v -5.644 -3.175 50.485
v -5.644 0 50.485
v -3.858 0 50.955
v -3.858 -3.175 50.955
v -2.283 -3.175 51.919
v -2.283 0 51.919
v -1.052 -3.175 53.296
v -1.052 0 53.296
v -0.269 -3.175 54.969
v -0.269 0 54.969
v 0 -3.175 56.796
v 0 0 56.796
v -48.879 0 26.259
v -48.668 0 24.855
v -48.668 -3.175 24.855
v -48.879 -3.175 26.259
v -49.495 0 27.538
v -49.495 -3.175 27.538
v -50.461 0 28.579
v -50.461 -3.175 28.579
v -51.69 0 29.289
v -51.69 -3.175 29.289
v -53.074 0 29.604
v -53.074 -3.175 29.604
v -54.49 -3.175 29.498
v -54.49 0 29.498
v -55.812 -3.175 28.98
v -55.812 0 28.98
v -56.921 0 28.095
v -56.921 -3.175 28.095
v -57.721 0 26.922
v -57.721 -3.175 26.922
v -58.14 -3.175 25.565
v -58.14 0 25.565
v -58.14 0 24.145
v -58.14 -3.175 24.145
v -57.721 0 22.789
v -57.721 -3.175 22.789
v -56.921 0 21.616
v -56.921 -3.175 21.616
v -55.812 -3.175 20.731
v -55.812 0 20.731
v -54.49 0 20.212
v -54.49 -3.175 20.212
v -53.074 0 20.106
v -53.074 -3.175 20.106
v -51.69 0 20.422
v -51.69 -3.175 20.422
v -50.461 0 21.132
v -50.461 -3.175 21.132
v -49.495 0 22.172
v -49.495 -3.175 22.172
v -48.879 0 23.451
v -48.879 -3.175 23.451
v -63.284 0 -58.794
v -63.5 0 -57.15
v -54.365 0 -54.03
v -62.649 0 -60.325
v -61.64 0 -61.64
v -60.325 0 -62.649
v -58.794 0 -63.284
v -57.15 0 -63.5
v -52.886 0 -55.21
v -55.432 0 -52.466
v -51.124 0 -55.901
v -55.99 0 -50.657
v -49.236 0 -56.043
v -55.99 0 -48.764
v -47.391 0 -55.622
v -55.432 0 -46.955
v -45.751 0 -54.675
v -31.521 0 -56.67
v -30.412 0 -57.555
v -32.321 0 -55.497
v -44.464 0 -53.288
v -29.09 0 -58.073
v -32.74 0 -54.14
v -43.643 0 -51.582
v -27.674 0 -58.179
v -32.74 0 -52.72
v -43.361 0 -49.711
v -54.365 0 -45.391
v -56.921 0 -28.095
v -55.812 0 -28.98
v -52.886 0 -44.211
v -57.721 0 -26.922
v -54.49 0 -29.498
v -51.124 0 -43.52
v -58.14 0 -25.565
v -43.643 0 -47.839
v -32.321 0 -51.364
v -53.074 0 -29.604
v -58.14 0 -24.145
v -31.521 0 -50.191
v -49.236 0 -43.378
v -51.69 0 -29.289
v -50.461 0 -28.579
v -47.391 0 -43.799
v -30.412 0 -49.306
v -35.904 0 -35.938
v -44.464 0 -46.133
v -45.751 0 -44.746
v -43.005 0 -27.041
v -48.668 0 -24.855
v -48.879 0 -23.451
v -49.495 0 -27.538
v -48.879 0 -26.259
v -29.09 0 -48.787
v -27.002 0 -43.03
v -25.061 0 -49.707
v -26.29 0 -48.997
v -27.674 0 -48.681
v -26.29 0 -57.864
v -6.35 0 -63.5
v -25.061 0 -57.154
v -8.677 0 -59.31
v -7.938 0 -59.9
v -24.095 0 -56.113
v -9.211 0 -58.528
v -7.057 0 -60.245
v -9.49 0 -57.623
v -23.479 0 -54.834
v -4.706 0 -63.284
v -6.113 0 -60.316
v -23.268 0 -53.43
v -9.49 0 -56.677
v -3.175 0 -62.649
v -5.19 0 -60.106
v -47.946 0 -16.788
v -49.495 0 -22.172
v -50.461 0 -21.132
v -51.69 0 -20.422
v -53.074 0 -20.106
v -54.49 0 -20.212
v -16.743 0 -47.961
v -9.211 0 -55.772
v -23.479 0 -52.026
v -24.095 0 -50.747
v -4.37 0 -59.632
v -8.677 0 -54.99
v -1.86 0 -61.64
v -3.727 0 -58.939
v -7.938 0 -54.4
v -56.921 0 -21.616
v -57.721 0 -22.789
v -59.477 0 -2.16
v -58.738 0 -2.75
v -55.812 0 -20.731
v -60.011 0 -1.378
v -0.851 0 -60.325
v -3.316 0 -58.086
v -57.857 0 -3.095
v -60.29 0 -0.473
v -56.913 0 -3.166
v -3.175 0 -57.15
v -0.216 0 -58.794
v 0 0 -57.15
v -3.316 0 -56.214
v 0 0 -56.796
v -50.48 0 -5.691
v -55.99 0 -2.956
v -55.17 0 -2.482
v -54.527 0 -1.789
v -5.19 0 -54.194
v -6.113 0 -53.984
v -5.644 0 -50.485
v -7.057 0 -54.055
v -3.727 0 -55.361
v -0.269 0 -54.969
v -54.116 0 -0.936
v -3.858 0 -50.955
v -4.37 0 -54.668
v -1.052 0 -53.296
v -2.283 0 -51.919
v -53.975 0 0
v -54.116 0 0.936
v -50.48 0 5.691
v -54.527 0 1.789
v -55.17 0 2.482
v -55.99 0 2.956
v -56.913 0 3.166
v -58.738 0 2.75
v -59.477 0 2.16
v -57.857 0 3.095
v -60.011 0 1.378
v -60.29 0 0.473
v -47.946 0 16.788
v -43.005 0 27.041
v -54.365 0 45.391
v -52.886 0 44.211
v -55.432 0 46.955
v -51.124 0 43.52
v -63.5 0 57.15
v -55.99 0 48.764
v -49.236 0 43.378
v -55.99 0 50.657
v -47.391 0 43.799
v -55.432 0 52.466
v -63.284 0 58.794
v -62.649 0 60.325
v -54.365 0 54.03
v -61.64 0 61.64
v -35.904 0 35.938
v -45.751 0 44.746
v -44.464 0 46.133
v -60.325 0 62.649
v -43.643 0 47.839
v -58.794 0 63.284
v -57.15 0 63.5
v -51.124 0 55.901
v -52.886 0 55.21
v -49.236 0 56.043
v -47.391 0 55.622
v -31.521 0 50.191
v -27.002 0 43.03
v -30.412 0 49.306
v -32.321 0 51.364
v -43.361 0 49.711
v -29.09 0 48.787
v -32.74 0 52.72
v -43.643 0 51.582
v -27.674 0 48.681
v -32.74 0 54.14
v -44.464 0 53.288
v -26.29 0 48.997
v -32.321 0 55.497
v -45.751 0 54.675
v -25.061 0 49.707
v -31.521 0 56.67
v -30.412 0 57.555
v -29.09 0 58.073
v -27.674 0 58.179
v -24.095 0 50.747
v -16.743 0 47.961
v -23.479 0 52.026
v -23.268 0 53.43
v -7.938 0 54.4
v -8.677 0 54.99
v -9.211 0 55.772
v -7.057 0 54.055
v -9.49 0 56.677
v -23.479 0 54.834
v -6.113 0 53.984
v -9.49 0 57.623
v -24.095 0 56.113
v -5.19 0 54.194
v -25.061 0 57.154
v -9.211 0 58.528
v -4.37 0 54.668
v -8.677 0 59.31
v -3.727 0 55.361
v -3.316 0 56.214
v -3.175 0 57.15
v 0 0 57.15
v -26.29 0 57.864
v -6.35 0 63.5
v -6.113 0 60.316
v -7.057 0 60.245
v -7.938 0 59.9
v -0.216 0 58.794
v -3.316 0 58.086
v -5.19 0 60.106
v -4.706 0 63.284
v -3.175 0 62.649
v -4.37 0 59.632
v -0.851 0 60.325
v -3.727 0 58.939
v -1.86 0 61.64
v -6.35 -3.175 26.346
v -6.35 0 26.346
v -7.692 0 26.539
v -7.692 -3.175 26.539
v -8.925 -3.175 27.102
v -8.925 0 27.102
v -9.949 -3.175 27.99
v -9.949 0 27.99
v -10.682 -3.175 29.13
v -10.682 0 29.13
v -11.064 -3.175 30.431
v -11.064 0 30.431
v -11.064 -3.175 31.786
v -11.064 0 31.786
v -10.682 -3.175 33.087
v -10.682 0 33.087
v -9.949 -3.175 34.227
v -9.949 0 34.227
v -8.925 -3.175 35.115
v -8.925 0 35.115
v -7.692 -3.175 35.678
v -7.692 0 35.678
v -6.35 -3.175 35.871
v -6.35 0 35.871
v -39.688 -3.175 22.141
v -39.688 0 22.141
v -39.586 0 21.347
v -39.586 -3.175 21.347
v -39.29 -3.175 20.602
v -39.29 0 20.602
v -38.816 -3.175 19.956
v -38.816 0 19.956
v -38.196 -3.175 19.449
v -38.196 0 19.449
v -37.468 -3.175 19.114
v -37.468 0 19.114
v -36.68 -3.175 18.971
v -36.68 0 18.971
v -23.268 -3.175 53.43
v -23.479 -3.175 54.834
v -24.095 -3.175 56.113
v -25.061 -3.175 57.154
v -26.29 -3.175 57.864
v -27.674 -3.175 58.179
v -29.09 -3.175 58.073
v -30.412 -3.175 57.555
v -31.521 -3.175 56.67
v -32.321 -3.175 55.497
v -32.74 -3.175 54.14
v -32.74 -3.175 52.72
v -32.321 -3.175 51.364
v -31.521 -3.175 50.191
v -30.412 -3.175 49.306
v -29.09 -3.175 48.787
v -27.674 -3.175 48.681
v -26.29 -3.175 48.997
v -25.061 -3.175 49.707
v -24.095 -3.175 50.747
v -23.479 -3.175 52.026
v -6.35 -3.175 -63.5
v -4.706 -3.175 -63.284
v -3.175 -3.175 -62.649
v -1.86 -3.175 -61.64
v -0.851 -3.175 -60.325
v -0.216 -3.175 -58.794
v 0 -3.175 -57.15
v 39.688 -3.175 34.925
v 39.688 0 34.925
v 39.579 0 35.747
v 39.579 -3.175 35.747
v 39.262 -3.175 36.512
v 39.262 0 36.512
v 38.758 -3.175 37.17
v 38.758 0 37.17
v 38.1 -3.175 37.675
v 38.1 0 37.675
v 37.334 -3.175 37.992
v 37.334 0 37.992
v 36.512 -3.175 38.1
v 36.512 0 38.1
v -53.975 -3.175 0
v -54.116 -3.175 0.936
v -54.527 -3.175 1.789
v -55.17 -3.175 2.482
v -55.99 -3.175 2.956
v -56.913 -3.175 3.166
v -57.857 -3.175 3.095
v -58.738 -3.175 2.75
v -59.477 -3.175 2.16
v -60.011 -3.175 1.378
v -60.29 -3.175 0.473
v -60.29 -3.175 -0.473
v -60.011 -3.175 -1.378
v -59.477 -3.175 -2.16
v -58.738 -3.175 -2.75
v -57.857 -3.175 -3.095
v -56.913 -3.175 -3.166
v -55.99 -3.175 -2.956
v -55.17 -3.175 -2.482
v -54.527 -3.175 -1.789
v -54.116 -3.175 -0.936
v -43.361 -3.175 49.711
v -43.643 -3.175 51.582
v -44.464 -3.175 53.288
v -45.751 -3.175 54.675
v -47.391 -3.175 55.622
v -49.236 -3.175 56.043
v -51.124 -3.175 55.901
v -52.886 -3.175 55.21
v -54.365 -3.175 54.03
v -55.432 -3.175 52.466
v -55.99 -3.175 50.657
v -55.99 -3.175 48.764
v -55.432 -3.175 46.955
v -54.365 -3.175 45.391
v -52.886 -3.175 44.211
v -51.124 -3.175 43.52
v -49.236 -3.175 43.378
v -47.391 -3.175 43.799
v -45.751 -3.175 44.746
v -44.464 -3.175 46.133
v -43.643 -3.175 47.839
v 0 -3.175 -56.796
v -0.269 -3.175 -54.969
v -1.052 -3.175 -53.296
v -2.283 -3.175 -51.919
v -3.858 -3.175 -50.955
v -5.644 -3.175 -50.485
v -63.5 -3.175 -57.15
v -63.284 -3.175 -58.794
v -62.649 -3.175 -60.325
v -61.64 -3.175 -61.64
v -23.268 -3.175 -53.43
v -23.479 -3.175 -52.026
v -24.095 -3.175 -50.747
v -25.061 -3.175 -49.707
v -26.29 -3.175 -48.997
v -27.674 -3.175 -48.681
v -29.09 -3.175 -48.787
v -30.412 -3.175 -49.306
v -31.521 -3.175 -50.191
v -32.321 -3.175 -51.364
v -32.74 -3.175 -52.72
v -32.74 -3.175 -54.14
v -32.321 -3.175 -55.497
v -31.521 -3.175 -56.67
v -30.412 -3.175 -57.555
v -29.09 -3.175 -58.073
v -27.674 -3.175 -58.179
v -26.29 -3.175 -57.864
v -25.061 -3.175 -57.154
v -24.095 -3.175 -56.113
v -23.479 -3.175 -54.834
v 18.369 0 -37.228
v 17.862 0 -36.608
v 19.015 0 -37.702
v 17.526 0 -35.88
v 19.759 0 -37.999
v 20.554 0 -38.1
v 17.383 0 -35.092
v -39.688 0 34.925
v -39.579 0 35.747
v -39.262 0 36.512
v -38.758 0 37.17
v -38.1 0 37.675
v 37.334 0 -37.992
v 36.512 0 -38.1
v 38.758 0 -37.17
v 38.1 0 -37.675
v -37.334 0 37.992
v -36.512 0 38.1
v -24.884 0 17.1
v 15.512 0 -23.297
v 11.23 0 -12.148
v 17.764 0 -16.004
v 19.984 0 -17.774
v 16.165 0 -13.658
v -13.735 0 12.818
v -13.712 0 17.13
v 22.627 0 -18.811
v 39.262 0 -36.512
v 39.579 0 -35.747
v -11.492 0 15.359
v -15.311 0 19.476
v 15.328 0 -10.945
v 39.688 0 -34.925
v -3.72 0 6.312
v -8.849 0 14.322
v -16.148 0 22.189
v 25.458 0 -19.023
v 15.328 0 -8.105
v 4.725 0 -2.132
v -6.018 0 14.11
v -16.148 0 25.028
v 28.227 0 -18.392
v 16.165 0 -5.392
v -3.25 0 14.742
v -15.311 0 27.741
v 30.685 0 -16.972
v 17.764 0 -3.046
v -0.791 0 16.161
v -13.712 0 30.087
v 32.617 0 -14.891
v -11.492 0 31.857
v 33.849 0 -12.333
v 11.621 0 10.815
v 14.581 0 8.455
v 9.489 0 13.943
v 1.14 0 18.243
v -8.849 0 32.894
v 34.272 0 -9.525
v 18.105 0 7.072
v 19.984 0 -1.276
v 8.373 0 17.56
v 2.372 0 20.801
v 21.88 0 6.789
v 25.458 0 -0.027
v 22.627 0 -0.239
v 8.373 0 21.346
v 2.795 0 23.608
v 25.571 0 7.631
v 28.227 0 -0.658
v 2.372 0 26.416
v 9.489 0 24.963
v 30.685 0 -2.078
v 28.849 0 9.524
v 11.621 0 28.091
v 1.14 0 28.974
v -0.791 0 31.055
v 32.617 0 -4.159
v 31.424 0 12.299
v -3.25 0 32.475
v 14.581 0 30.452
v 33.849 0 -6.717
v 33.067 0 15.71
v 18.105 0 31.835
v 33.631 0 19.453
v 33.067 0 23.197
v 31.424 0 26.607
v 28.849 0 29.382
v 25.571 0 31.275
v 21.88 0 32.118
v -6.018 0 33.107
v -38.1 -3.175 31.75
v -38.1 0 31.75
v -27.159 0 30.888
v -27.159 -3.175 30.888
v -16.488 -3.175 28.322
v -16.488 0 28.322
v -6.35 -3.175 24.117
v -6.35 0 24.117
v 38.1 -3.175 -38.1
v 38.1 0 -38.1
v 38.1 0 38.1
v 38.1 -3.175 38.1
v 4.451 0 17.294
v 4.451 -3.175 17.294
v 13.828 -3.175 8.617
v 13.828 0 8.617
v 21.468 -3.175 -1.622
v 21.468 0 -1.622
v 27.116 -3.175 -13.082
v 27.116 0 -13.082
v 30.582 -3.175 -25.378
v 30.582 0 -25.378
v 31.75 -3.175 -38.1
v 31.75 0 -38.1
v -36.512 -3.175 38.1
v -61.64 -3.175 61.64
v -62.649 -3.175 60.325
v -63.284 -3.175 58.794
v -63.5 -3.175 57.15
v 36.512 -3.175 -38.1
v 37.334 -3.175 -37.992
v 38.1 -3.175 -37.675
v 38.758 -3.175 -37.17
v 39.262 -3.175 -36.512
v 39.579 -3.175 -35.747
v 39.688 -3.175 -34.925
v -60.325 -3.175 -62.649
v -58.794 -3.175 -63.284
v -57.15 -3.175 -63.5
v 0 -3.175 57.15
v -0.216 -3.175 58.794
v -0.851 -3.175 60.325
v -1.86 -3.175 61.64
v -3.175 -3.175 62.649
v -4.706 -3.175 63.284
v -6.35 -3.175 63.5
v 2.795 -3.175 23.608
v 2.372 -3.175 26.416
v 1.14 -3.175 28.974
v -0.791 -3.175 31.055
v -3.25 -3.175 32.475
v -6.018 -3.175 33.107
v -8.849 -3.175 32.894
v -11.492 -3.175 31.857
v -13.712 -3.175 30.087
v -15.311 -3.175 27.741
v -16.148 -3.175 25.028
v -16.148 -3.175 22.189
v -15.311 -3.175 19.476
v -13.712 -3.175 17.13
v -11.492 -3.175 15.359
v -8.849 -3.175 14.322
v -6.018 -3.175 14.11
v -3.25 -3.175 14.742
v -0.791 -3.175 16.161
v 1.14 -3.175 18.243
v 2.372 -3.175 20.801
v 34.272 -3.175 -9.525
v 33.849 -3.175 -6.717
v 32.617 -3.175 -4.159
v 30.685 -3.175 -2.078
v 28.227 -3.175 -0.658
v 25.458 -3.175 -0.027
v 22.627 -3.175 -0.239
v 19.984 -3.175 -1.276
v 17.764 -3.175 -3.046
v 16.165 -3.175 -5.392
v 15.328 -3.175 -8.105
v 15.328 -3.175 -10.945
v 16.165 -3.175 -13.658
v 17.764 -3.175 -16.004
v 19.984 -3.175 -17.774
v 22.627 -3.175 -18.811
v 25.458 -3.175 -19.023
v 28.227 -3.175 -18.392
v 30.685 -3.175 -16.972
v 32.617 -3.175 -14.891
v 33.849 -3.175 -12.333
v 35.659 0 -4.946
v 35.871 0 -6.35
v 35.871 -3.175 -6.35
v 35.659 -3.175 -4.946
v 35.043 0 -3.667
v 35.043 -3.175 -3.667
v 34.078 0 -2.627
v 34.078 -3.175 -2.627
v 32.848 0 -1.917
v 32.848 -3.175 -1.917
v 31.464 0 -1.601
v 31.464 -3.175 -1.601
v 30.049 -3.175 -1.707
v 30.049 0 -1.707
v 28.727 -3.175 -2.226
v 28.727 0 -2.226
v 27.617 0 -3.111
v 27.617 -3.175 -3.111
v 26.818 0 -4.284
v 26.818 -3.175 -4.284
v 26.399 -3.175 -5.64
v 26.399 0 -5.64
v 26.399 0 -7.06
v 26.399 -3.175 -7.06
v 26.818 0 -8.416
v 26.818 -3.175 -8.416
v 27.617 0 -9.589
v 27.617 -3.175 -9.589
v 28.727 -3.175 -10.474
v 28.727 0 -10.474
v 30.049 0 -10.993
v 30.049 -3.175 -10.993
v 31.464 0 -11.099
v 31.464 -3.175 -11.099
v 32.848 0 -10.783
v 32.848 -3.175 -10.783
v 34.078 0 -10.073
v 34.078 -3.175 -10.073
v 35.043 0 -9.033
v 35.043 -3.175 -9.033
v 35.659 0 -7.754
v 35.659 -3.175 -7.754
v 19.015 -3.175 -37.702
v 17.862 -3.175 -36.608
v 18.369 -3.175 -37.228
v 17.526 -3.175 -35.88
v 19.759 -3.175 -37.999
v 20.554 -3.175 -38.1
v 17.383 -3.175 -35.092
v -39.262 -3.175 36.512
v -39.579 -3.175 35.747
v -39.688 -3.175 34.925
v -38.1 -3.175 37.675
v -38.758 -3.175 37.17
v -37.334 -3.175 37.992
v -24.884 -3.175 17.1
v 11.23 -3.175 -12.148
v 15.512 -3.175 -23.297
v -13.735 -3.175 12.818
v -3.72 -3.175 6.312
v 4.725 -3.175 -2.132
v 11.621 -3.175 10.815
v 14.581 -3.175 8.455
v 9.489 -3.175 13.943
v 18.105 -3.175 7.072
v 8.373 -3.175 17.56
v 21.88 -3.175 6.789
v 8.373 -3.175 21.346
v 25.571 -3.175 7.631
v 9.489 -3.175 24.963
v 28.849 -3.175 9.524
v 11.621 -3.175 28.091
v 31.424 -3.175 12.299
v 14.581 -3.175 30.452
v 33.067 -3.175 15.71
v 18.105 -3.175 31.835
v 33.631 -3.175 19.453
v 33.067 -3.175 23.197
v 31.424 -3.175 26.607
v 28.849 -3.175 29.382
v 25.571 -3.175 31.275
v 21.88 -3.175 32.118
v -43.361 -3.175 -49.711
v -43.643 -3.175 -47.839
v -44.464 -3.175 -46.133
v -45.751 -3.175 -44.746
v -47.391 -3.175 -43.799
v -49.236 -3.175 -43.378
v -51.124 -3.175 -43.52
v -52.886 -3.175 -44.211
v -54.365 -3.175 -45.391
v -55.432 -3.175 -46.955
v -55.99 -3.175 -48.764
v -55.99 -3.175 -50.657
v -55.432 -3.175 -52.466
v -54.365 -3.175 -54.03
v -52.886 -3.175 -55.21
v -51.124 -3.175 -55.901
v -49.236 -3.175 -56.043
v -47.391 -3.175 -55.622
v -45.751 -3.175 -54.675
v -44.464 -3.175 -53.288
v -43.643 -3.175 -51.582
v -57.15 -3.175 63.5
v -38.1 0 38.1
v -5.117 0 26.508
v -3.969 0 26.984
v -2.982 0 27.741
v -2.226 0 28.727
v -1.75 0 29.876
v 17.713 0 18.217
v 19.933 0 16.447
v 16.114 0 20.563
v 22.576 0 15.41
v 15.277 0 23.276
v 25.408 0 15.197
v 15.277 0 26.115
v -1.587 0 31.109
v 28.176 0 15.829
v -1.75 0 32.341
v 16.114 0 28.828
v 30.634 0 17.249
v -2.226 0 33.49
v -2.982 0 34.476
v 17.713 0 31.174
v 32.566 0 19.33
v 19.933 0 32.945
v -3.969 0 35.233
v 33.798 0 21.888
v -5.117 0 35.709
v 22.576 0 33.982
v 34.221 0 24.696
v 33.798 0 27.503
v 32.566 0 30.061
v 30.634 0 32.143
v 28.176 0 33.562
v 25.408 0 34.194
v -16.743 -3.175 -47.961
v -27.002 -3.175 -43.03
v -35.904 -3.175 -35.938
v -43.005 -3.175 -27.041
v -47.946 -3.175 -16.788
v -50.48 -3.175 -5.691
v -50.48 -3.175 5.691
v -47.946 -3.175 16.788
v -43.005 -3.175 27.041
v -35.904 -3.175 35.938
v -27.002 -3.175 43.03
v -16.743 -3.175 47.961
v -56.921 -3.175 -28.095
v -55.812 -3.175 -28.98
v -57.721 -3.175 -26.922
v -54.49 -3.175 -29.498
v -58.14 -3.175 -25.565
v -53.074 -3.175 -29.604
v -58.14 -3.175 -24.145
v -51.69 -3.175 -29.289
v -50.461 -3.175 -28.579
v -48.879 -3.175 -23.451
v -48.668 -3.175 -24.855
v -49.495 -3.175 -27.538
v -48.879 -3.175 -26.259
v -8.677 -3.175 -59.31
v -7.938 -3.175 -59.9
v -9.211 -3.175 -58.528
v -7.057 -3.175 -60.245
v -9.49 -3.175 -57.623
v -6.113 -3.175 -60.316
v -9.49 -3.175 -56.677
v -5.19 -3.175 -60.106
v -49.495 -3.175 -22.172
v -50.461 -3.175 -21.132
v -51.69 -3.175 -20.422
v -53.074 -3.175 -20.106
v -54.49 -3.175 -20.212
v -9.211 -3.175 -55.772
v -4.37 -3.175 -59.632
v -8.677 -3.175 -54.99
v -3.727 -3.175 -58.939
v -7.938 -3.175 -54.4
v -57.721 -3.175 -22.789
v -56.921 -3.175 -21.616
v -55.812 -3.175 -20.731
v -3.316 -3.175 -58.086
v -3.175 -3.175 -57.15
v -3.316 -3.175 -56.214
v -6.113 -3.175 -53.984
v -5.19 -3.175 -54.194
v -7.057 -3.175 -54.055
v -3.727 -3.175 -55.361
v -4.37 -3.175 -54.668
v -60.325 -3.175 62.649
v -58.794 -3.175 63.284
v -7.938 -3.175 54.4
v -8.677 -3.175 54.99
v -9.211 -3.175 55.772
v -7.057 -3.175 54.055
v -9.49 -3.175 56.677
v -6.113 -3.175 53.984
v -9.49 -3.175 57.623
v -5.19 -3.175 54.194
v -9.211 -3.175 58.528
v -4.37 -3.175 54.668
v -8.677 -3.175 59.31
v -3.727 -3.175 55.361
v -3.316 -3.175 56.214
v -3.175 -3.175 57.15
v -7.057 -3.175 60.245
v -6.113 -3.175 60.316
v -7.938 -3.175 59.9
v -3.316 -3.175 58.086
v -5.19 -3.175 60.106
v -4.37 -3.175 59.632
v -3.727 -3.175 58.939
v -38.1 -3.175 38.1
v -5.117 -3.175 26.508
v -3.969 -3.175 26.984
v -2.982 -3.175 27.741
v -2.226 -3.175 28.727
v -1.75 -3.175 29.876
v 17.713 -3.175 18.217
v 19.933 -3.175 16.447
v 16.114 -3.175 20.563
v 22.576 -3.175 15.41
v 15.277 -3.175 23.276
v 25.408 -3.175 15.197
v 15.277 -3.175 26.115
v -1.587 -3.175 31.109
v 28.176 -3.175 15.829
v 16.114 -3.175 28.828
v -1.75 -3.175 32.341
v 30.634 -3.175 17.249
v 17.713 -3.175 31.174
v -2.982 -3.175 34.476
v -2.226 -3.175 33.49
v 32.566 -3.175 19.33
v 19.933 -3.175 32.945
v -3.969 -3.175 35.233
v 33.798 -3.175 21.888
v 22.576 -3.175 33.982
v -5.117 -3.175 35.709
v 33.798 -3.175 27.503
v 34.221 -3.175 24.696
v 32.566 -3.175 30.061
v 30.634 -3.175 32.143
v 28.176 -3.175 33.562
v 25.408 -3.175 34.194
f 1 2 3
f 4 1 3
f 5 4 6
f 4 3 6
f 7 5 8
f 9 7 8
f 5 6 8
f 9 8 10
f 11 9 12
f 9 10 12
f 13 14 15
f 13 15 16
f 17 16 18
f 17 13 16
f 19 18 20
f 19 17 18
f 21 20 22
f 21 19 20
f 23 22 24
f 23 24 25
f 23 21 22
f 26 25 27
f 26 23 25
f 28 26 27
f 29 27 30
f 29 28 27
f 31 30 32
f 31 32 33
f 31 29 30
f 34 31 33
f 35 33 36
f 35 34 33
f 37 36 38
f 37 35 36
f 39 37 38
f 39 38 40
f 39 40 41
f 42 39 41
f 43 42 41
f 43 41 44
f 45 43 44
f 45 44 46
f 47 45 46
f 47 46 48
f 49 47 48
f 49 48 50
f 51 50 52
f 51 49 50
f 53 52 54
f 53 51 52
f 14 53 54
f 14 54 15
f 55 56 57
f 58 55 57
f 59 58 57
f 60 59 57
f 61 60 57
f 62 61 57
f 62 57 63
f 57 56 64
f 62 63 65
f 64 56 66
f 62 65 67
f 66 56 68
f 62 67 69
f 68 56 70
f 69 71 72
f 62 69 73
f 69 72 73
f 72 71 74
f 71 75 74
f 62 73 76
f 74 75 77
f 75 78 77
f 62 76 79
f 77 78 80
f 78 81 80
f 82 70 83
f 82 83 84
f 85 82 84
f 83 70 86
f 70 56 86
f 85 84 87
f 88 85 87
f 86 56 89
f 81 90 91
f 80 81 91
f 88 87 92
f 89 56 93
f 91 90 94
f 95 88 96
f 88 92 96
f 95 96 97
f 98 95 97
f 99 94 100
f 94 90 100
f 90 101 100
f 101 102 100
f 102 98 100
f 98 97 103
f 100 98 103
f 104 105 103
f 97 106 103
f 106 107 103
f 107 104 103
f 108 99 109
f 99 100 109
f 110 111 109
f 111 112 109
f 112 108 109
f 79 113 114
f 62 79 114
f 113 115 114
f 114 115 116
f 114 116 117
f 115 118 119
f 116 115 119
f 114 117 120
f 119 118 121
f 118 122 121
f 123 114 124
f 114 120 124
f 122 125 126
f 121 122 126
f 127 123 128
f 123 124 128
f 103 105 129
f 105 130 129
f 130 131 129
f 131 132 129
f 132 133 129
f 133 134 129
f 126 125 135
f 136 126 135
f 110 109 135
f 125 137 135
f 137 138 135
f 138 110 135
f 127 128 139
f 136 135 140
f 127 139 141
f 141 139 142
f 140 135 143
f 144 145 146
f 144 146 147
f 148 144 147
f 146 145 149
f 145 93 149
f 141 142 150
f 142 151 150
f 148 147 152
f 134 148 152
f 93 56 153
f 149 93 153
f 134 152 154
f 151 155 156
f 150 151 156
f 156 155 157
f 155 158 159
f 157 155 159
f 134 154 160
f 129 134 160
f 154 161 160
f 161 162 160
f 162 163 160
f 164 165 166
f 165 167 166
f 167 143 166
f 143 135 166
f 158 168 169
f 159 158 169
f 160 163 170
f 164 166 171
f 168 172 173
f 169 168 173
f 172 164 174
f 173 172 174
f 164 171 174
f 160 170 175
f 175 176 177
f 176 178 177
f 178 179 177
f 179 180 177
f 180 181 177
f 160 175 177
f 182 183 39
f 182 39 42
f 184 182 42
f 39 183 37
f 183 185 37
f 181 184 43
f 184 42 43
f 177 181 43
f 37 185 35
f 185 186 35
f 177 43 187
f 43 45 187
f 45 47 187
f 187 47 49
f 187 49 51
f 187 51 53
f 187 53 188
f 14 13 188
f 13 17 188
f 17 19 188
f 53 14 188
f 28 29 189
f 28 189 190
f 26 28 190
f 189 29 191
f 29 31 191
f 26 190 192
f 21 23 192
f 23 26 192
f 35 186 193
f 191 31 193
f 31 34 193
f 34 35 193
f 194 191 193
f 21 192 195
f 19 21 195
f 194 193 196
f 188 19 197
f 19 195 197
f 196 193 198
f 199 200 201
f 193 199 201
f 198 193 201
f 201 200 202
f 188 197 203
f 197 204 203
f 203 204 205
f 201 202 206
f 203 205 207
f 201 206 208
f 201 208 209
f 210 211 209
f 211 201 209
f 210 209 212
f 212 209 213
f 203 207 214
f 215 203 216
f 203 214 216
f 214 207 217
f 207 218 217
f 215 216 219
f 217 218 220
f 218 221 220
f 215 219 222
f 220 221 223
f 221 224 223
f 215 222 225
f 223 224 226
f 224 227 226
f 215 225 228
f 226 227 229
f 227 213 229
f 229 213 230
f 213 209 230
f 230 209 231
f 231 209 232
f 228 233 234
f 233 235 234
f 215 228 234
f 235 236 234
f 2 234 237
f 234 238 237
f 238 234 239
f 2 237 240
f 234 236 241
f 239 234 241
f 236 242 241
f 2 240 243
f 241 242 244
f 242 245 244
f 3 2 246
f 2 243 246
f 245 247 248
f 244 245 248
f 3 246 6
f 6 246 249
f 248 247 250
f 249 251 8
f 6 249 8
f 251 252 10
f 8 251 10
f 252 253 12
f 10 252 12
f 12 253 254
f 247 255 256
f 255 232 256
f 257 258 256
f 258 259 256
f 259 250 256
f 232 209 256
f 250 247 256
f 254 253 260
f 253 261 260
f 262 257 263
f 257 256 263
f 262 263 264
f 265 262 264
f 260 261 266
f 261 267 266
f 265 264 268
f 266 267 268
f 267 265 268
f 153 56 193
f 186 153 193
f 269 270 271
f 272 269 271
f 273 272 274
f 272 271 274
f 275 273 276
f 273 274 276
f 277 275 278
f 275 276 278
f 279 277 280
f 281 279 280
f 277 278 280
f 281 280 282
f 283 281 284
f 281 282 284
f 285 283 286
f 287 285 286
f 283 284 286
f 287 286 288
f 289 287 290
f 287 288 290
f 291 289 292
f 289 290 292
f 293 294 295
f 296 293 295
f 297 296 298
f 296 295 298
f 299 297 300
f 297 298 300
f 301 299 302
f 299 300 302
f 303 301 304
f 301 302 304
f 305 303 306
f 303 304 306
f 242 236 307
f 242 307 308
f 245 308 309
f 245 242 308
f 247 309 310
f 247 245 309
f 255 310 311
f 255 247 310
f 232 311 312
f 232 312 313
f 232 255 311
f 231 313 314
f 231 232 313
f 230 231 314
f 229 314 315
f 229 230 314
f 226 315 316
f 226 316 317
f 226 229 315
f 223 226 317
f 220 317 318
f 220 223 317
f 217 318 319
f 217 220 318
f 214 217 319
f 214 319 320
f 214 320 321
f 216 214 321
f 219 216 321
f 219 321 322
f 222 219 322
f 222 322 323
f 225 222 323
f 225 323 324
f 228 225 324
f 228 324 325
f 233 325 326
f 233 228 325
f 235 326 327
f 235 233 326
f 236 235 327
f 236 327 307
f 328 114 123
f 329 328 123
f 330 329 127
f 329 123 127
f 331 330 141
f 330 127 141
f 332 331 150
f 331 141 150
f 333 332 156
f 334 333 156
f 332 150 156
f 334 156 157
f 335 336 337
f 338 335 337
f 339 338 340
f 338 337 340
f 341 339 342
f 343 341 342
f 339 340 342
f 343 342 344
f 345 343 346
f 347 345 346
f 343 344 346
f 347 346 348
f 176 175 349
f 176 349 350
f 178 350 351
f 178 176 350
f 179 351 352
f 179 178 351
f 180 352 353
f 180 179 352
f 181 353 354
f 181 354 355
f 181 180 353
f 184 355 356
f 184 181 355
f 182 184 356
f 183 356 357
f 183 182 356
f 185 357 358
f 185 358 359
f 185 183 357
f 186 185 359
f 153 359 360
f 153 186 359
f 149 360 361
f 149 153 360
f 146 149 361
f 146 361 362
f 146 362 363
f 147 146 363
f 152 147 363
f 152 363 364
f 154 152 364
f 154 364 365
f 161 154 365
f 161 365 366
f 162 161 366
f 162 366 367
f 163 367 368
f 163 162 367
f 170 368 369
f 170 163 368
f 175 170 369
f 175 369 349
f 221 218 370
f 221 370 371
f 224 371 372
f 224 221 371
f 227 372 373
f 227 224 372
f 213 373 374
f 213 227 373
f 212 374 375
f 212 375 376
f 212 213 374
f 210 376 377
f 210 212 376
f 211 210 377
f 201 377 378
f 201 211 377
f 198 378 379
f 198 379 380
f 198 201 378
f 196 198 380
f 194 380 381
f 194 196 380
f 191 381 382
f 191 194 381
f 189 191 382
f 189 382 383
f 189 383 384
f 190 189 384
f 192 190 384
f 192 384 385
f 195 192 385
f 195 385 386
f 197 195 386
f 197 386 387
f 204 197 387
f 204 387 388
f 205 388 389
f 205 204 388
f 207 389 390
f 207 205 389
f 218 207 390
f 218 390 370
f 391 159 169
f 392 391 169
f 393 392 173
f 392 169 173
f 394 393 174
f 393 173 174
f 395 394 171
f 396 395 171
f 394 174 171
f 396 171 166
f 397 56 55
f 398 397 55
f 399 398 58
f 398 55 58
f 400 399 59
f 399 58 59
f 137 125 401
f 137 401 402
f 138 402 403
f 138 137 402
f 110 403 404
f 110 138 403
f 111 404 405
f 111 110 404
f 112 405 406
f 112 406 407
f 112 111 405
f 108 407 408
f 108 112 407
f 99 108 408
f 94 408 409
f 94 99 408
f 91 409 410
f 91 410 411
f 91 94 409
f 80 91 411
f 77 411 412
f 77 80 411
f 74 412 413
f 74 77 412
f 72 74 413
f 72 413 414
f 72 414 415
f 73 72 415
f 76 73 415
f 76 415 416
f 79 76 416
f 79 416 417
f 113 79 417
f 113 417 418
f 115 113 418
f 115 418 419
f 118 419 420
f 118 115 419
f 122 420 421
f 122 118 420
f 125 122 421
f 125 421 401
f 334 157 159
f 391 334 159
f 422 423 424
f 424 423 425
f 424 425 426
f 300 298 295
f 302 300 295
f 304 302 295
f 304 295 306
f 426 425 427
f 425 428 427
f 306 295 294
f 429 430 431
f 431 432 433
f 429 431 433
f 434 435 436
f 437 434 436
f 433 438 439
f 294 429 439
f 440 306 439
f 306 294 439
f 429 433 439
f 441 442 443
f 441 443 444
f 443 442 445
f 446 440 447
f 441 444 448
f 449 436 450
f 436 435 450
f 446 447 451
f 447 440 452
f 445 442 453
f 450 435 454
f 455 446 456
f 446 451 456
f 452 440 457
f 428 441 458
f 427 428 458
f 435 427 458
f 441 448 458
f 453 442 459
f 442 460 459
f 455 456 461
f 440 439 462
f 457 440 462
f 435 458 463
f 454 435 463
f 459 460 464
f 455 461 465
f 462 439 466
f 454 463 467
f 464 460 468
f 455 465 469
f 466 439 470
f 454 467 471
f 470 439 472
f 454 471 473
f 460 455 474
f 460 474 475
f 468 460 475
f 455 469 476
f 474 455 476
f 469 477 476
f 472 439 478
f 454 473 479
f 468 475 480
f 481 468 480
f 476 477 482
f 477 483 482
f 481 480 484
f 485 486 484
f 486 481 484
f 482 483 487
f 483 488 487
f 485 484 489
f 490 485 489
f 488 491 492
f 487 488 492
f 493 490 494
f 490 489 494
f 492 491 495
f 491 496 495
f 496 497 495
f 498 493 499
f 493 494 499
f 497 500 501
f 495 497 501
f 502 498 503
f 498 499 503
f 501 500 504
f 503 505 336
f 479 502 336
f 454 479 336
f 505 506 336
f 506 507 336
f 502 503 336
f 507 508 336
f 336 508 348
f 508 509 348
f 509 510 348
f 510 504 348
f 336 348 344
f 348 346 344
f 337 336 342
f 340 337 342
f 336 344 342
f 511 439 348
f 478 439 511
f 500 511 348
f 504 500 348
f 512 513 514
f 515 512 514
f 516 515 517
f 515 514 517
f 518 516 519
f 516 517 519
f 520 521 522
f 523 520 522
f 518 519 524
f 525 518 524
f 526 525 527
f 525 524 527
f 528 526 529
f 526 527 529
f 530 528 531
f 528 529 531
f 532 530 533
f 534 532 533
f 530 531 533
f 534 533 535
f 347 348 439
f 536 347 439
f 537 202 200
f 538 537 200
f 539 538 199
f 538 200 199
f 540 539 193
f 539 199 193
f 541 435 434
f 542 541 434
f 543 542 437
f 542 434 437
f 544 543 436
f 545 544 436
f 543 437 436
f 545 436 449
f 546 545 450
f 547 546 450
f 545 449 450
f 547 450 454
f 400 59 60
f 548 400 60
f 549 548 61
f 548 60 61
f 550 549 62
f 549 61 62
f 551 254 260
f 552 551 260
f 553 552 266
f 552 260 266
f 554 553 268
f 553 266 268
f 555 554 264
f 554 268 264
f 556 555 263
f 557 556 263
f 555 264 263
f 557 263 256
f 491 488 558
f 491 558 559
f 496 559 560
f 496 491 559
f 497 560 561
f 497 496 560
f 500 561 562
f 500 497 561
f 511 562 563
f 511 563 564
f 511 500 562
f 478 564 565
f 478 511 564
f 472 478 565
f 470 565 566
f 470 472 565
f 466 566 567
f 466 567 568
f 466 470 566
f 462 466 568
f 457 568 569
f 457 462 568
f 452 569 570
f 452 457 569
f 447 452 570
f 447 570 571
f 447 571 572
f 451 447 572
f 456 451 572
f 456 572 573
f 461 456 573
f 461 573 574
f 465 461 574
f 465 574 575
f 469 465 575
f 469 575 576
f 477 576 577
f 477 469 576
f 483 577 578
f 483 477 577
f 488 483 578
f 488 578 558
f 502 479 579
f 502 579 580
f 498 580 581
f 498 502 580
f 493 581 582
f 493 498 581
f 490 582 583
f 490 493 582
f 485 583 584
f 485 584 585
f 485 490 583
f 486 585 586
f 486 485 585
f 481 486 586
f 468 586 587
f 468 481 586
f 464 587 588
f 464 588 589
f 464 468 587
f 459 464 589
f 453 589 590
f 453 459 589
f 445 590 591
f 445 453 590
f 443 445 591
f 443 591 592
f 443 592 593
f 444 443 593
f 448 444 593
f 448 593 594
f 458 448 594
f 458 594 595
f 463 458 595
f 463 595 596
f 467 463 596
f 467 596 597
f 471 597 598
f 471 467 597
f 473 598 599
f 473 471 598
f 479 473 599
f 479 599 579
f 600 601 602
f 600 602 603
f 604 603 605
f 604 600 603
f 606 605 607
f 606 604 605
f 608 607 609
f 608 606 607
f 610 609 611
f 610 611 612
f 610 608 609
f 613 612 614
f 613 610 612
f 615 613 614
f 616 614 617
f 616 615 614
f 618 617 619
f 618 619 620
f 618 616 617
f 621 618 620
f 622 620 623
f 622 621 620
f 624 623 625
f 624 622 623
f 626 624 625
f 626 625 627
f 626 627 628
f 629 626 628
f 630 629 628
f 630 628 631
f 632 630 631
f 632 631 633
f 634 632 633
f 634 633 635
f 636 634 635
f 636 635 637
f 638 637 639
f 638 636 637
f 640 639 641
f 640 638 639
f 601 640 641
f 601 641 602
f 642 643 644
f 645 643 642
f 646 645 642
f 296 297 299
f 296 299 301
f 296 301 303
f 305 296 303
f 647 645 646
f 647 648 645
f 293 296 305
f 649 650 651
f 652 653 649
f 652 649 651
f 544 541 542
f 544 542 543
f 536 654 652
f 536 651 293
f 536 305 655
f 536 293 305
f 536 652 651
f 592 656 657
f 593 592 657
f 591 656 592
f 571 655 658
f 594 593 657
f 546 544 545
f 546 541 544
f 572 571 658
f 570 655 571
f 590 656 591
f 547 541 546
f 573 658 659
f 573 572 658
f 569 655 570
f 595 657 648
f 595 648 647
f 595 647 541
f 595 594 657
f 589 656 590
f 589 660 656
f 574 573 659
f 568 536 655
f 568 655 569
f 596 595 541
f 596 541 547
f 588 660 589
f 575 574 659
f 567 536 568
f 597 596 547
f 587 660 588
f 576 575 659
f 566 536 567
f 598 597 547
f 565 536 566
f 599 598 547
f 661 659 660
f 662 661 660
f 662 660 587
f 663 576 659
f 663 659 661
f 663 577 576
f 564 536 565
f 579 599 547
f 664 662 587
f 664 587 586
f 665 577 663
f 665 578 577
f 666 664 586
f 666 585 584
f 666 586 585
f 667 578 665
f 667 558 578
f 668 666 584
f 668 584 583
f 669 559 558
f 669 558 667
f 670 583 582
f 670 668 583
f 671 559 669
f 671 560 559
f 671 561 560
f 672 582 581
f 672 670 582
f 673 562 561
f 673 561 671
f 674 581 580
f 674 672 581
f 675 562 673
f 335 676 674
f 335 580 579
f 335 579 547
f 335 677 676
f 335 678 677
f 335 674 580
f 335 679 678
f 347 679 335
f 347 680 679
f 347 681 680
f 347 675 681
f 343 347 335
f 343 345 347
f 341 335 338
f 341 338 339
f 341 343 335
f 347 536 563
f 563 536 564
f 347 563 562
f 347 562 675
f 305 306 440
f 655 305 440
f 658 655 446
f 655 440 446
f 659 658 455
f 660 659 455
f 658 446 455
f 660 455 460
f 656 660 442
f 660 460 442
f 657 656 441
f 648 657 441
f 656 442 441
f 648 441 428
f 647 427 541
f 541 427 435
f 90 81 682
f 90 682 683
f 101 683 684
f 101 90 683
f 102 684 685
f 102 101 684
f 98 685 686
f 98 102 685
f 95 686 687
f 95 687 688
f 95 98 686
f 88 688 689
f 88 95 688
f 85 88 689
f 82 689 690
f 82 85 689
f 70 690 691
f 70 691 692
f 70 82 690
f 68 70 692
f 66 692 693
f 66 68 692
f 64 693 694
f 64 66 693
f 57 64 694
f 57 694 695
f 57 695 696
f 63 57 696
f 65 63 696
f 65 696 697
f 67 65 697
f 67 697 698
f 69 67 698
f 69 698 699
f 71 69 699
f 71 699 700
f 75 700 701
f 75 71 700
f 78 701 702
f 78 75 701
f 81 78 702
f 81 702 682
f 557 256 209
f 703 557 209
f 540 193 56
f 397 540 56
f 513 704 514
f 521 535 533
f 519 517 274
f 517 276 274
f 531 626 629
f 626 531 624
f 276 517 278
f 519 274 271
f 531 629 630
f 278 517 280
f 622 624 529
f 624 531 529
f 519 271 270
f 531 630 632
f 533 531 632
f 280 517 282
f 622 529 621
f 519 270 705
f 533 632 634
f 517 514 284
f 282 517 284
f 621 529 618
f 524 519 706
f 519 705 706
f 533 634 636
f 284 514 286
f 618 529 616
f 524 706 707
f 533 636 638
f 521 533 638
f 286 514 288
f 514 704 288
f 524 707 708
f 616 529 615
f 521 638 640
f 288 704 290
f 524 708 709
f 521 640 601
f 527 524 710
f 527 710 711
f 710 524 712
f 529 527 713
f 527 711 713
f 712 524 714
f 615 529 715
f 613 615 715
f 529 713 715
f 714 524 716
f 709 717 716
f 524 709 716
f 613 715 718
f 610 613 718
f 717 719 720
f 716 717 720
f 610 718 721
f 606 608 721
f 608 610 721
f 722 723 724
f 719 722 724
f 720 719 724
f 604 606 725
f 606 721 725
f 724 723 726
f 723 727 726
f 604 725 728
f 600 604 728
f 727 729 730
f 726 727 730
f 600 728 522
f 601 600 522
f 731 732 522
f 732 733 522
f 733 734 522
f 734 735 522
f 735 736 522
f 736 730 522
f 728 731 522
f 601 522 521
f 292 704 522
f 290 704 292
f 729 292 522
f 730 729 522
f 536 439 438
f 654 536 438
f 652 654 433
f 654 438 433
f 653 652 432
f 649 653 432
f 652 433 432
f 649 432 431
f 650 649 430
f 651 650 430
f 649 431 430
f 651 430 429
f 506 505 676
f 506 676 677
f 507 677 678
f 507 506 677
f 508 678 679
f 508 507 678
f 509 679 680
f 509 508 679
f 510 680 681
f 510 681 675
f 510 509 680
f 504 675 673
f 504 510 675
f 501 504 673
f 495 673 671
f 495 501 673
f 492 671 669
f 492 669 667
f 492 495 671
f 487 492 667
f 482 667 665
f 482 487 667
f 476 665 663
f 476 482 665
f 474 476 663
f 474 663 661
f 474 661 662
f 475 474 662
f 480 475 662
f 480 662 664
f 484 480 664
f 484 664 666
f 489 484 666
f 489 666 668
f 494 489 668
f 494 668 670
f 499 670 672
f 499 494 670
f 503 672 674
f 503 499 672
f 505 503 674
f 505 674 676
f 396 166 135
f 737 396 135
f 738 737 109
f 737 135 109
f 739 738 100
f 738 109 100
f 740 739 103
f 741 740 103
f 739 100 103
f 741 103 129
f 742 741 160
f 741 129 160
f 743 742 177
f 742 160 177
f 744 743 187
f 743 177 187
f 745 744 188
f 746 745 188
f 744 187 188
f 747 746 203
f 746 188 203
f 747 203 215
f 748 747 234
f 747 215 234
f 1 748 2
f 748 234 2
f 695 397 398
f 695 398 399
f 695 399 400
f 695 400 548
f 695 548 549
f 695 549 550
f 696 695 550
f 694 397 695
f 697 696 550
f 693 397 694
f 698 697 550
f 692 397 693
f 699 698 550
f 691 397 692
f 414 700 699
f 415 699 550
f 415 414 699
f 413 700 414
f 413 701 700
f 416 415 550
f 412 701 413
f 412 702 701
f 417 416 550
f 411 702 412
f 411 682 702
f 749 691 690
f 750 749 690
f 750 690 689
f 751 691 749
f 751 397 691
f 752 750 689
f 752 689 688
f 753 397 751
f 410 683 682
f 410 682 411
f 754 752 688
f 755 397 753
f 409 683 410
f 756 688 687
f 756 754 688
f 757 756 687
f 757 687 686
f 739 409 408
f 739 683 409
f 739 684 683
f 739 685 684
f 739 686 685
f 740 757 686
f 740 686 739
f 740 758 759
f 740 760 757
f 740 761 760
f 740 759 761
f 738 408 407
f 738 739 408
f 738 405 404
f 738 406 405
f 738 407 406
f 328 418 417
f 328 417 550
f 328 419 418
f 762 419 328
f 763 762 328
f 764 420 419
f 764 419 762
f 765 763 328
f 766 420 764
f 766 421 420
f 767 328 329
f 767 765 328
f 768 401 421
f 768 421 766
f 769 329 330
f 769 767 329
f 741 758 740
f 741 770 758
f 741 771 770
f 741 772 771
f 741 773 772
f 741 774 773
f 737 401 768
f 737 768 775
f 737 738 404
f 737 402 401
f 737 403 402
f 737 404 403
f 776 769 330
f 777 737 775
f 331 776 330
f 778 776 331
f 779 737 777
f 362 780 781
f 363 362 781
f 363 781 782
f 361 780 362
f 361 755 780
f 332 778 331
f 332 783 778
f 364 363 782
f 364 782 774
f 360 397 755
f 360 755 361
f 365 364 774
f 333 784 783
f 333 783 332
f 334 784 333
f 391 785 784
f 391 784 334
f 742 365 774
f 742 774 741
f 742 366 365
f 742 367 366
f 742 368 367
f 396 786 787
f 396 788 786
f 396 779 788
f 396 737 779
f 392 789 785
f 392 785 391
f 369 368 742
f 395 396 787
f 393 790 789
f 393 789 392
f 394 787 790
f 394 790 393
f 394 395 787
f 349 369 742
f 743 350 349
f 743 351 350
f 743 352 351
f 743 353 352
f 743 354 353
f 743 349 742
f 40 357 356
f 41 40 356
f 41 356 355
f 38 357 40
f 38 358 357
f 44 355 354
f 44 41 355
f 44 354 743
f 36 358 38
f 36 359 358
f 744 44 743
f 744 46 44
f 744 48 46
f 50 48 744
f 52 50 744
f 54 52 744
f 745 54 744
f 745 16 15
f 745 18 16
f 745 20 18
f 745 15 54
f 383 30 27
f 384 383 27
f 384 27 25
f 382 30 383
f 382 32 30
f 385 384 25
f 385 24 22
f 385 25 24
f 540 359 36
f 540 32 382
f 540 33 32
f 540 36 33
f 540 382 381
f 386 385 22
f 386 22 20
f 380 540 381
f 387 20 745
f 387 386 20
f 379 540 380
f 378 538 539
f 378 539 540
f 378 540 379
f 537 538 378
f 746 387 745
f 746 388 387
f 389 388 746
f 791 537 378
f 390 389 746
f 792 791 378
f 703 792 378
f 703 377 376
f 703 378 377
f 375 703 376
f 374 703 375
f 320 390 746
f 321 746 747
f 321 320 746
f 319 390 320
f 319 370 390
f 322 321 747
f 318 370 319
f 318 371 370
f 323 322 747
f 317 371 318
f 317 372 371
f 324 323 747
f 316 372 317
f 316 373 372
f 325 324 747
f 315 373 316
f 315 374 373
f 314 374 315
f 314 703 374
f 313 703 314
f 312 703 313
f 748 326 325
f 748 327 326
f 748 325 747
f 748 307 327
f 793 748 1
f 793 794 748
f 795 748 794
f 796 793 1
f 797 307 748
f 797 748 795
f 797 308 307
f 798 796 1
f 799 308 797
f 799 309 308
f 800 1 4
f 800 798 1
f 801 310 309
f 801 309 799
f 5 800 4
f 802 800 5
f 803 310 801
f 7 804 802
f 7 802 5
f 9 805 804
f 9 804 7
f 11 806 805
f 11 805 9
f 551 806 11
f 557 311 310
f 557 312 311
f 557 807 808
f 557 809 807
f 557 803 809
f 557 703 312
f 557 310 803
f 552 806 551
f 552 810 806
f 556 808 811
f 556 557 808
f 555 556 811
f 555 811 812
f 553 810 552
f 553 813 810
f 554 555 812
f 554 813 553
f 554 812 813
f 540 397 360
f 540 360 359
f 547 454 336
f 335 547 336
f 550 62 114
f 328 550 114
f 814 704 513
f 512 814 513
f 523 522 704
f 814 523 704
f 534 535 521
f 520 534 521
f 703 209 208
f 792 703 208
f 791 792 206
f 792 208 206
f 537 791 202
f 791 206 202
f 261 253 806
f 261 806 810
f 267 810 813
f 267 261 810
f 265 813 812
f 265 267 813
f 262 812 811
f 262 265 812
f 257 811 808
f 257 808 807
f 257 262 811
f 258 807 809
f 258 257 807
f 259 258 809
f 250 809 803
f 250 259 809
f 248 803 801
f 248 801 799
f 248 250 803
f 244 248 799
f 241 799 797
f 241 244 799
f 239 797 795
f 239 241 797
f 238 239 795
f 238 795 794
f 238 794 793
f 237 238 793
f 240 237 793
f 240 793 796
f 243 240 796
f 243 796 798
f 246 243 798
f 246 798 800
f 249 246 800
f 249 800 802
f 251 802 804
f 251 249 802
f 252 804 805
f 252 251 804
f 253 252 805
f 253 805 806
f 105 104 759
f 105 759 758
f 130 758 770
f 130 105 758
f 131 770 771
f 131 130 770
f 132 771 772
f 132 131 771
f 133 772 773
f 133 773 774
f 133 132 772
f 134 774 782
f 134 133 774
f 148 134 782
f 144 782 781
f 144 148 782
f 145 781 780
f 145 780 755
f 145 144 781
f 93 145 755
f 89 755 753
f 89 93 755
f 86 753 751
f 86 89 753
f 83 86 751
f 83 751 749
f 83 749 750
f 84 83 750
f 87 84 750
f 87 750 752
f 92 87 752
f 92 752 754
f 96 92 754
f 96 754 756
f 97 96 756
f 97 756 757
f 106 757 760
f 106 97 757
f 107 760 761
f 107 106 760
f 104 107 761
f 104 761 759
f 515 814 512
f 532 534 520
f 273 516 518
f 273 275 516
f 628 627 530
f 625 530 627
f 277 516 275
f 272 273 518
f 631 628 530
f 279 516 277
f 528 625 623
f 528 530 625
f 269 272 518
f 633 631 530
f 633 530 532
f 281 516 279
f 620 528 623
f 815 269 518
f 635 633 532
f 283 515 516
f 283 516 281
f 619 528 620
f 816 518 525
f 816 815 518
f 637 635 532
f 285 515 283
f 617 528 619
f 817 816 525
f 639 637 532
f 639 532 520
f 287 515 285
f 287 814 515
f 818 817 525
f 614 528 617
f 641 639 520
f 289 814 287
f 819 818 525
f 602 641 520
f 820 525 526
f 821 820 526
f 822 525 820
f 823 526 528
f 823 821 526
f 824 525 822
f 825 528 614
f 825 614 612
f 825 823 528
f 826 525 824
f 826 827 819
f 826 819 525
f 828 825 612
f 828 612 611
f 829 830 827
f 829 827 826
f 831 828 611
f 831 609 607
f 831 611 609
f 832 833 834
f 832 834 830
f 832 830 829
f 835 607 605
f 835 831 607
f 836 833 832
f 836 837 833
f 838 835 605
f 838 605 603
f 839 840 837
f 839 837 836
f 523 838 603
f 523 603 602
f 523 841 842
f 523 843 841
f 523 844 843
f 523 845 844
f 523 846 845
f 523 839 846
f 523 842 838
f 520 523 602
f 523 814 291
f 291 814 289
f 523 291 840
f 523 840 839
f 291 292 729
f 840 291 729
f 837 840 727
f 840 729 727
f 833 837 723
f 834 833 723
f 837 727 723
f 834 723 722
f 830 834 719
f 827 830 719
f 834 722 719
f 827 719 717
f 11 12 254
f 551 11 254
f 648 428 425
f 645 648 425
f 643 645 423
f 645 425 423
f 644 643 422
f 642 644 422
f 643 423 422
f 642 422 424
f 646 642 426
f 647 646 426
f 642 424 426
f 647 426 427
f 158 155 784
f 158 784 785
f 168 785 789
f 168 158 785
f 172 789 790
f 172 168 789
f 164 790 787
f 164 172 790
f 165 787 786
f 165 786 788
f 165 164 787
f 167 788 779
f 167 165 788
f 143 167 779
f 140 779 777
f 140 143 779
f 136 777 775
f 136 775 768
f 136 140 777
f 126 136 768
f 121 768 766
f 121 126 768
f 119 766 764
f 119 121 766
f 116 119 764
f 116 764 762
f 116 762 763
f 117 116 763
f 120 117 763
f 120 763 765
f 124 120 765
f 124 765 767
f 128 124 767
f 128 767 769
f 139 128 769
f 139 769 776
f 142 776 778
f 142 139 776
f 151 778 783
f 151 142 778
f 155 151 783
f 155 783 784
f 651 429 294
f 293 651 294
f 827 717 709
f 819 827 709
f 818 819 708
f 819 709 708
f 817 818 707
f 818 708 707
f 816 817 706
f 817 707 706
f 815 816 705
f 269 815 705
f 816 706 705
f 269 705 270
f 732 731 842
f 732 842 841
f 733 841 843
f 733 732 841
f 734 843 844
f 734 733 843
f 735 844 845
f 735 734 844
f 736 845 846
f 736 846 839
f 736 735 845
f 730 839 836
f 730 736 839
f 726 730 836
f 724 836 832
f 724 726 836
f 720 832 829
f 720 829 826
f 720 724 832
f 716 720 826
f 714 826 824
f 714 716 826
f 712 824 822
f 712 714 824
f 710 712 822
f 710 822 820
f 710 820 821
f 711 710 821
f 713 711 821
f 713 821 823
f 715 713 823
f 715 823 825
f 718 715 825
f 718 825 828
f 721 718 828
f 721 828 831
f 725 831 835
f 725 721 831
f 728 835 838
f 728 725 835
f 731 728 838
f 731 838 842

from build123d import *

# Parameters (mm, degrees)
F0_R     = 4.7625
F0_R_2   = 9.525
F1_DEPTH = 3.175
F2_R     = 9.525
F2_R_2   = 12.7
F3_DEPTH = 3.175
F4_R     = 6.35
F4_R_2   = 4.7625
F4_R_3   = 3.175
F5_DEPTH = 3.175


with BuildPart() as f1:
    # F0 (on Front) → F1 (new body)
    with BuildSketch(Plane.XZ):
        with BuildLine():
            Line((38.1, -38.1), (38.1, 38.1))
            Line((38.1, 38.1), (-6.35, 38.1))
            Line((-6.35, 38.1), (-6.35, 35.87102))
            ThreePointArc((-6.35, 35.87102), (-2.982404, 34.476116), (-1.5875, 31.10852))
            ThreePointArc((-1.5875, 31.10852), (-2.982404, 27.740924), (-6.35, 26.34602))
            Line((-6.35, 26.34602), (-6.35, 24.117039))
            ThreePointArc((-6.35, 24.117039), (21.46828, -1.622027), (31.75, -38.1))
            Line((31.75, -38.1), (38.1, -38.1))
        make_face()
        with Locations((31.10852, -6.35)):
            Circle(F0_R, mode=Mode.SUBTRACT)
        with Locations((24.695704, 24.695704)):
            Circle(F0_R_2, mode=Mode.SUBTRACT)
        with BuildLine():
            Line((-6.35, 35.87102), (-6.35, 38.1))
            Line((-6.35, 38.1), (-38.1, 38.1))
            Line((-38.1, 38.1), (-38.1, 31.75))
            ThreePointArc((-38.1, 31.75), (-21.772687, 29.814957), (-6.35, 24.117039))
            Line((-6.35, 24.117039), (-6.35, 26.34602))
            ThreePointArc((-6.35, 26.34602), (-11.1125, 31.10852), (-6.35, 35.87102))
        make_face()
    extrude(amount=F1_DEPTH)


with BuildPart() as f3:
    # F2 (on Front) → F3 (new body)
    with BuildSketch(Plane.XZ):
        with BuildLine():
            ThreePointArc((39.6875, 34.925), (38.757564, 37.170064), (36.5125, 38.1))
            Line((36.5125, 38.1), (-36.5125, 38.1))
            ThreePointArc((-36.5125, 38.1), (-38.757564, 37.170064), (-39.6875, 34.925))
            Line((-39.6875, 34.925), (-39.6875, 22.141389))
            ThreePointArc((-39.6875, 22.141389), (-38.815887, 19.956205), (-36.679605, 18.97079))
            ThreePointArc((-36.679605, 18.97079), (0.723653, 2.311153), (17.38329, -35.092105))
            ThreePointArc((17.38329, -35.092105), (18.368705, -37.228387), (20.553889, -38.1))
            Line((20.553889, -38.1), (36.5125, -38.1))
            ThreePointArc((36.5125, -38.1), (38.757564, -37.170064), (39.6875, -34.925))
            Line((39.6875, -34.925), (39.6875, 34.925))
        make_face()
        with Locations((24.746676, -9.525)):
            Circle(F2_R, mode=Mode.SUBTRACT)
        with Locations((-6.729639, 23.608257)):
            Circle(F2_R, mode=Mode.SUBTRACT)
        with Locations((20.930961, 19.453162)):
            Circle(F2_R_2, mode=Mode.SUBTRACT)
    extrude(amount=F3_DEPTH)


with BuildPart() as f5:
    # F4 (on Front) → F5 (new body)
    with BuildSketch(Plane.XZ):
        with BuildLine():
            ThreePointArc((0, 57.15), (-1.859872, 61.640128), (-6.35, 63.5))
            Line((-6.35, 63.5), (-57.15, 63.5))
            ThreePointArc((-57.15, 63.5), (-59.58004, 63.016635), (-61.640128, 61.640128))
            ThreePointArc((-61.640128, 61.640128), (-63.016635, 59.58004), (-63.5, 57.15))
            Line((-63.5, 57.15), (-63.5, -57.15))
            ThreePointArc((-63.5, -57.15), (-63.016635, -59.58004), (-61.640128, -61.640128))
            ThreePointArc((-61.640128, -61.640128), (-59.58004, -63.016635), (-57.15, -63.5))
            Line((-57.15, -63.5), (-6.35, -63.5))
            ThreePointArc((-6.35, -63.5), (-1.859872, -61.640128), (0, -57.15))
            Line((0, -57.15), (0, -56.796127))
            ThreePointArc((0, -56.796127), (-1.616989, -52.562793), (-5.644444, -50.485446))
            ThreePointArc((-5.644444, -50.485446), (-50.8, 0), (-5.644444, 50.485446))
            ThreePointArc((-5.644444, 50.485446), (-1.616989, 52.562793), (0, 56.796127))
            Line((0, 56.796127), (0, 57.15))
        make_face()
        with Locations((-49.710512, -49.710512)):
            Circle(F4_R, mode=Mode.SUBTRACT)
        with Locations((-53.430256, -24.855256)):
            Circle(F4_R_2, mode=Mode.SUBTRACT)
        with Locations((-28.030256, -53.430256)):
            Circle(F4_R_2, mode=Mode.SUBTRACT)
        with Locations((-6.35, -57.15)):
            Circle(F4_R_3, mode=Mode.SUBTRACT)
        with Locations((-57.15, 0)):
            Circle(F4_R_3, mode=Mode.SUBTRACT)
        with Locations((-53.430256, 24.855256)):
            Circle(F4_R_2, mode=Mode.SUBTRACT)
        with Locations((-49.710512, 49.710512)):
            Circle(F4_R, mode=Mode.SUBTRACT)
        with Locations((-28.030256, 53.430256)):
            Circle(F4_R_2, mode=Mode.SUBTRACT)
        with Locations((-6.35, 57.15)):
            Circle(F4_R_3, mode=Mode.SUBTRACT)
    extrude(amount=F5_DEPTH)


solid = Compound([f1.part, f3.part, f5.part])
